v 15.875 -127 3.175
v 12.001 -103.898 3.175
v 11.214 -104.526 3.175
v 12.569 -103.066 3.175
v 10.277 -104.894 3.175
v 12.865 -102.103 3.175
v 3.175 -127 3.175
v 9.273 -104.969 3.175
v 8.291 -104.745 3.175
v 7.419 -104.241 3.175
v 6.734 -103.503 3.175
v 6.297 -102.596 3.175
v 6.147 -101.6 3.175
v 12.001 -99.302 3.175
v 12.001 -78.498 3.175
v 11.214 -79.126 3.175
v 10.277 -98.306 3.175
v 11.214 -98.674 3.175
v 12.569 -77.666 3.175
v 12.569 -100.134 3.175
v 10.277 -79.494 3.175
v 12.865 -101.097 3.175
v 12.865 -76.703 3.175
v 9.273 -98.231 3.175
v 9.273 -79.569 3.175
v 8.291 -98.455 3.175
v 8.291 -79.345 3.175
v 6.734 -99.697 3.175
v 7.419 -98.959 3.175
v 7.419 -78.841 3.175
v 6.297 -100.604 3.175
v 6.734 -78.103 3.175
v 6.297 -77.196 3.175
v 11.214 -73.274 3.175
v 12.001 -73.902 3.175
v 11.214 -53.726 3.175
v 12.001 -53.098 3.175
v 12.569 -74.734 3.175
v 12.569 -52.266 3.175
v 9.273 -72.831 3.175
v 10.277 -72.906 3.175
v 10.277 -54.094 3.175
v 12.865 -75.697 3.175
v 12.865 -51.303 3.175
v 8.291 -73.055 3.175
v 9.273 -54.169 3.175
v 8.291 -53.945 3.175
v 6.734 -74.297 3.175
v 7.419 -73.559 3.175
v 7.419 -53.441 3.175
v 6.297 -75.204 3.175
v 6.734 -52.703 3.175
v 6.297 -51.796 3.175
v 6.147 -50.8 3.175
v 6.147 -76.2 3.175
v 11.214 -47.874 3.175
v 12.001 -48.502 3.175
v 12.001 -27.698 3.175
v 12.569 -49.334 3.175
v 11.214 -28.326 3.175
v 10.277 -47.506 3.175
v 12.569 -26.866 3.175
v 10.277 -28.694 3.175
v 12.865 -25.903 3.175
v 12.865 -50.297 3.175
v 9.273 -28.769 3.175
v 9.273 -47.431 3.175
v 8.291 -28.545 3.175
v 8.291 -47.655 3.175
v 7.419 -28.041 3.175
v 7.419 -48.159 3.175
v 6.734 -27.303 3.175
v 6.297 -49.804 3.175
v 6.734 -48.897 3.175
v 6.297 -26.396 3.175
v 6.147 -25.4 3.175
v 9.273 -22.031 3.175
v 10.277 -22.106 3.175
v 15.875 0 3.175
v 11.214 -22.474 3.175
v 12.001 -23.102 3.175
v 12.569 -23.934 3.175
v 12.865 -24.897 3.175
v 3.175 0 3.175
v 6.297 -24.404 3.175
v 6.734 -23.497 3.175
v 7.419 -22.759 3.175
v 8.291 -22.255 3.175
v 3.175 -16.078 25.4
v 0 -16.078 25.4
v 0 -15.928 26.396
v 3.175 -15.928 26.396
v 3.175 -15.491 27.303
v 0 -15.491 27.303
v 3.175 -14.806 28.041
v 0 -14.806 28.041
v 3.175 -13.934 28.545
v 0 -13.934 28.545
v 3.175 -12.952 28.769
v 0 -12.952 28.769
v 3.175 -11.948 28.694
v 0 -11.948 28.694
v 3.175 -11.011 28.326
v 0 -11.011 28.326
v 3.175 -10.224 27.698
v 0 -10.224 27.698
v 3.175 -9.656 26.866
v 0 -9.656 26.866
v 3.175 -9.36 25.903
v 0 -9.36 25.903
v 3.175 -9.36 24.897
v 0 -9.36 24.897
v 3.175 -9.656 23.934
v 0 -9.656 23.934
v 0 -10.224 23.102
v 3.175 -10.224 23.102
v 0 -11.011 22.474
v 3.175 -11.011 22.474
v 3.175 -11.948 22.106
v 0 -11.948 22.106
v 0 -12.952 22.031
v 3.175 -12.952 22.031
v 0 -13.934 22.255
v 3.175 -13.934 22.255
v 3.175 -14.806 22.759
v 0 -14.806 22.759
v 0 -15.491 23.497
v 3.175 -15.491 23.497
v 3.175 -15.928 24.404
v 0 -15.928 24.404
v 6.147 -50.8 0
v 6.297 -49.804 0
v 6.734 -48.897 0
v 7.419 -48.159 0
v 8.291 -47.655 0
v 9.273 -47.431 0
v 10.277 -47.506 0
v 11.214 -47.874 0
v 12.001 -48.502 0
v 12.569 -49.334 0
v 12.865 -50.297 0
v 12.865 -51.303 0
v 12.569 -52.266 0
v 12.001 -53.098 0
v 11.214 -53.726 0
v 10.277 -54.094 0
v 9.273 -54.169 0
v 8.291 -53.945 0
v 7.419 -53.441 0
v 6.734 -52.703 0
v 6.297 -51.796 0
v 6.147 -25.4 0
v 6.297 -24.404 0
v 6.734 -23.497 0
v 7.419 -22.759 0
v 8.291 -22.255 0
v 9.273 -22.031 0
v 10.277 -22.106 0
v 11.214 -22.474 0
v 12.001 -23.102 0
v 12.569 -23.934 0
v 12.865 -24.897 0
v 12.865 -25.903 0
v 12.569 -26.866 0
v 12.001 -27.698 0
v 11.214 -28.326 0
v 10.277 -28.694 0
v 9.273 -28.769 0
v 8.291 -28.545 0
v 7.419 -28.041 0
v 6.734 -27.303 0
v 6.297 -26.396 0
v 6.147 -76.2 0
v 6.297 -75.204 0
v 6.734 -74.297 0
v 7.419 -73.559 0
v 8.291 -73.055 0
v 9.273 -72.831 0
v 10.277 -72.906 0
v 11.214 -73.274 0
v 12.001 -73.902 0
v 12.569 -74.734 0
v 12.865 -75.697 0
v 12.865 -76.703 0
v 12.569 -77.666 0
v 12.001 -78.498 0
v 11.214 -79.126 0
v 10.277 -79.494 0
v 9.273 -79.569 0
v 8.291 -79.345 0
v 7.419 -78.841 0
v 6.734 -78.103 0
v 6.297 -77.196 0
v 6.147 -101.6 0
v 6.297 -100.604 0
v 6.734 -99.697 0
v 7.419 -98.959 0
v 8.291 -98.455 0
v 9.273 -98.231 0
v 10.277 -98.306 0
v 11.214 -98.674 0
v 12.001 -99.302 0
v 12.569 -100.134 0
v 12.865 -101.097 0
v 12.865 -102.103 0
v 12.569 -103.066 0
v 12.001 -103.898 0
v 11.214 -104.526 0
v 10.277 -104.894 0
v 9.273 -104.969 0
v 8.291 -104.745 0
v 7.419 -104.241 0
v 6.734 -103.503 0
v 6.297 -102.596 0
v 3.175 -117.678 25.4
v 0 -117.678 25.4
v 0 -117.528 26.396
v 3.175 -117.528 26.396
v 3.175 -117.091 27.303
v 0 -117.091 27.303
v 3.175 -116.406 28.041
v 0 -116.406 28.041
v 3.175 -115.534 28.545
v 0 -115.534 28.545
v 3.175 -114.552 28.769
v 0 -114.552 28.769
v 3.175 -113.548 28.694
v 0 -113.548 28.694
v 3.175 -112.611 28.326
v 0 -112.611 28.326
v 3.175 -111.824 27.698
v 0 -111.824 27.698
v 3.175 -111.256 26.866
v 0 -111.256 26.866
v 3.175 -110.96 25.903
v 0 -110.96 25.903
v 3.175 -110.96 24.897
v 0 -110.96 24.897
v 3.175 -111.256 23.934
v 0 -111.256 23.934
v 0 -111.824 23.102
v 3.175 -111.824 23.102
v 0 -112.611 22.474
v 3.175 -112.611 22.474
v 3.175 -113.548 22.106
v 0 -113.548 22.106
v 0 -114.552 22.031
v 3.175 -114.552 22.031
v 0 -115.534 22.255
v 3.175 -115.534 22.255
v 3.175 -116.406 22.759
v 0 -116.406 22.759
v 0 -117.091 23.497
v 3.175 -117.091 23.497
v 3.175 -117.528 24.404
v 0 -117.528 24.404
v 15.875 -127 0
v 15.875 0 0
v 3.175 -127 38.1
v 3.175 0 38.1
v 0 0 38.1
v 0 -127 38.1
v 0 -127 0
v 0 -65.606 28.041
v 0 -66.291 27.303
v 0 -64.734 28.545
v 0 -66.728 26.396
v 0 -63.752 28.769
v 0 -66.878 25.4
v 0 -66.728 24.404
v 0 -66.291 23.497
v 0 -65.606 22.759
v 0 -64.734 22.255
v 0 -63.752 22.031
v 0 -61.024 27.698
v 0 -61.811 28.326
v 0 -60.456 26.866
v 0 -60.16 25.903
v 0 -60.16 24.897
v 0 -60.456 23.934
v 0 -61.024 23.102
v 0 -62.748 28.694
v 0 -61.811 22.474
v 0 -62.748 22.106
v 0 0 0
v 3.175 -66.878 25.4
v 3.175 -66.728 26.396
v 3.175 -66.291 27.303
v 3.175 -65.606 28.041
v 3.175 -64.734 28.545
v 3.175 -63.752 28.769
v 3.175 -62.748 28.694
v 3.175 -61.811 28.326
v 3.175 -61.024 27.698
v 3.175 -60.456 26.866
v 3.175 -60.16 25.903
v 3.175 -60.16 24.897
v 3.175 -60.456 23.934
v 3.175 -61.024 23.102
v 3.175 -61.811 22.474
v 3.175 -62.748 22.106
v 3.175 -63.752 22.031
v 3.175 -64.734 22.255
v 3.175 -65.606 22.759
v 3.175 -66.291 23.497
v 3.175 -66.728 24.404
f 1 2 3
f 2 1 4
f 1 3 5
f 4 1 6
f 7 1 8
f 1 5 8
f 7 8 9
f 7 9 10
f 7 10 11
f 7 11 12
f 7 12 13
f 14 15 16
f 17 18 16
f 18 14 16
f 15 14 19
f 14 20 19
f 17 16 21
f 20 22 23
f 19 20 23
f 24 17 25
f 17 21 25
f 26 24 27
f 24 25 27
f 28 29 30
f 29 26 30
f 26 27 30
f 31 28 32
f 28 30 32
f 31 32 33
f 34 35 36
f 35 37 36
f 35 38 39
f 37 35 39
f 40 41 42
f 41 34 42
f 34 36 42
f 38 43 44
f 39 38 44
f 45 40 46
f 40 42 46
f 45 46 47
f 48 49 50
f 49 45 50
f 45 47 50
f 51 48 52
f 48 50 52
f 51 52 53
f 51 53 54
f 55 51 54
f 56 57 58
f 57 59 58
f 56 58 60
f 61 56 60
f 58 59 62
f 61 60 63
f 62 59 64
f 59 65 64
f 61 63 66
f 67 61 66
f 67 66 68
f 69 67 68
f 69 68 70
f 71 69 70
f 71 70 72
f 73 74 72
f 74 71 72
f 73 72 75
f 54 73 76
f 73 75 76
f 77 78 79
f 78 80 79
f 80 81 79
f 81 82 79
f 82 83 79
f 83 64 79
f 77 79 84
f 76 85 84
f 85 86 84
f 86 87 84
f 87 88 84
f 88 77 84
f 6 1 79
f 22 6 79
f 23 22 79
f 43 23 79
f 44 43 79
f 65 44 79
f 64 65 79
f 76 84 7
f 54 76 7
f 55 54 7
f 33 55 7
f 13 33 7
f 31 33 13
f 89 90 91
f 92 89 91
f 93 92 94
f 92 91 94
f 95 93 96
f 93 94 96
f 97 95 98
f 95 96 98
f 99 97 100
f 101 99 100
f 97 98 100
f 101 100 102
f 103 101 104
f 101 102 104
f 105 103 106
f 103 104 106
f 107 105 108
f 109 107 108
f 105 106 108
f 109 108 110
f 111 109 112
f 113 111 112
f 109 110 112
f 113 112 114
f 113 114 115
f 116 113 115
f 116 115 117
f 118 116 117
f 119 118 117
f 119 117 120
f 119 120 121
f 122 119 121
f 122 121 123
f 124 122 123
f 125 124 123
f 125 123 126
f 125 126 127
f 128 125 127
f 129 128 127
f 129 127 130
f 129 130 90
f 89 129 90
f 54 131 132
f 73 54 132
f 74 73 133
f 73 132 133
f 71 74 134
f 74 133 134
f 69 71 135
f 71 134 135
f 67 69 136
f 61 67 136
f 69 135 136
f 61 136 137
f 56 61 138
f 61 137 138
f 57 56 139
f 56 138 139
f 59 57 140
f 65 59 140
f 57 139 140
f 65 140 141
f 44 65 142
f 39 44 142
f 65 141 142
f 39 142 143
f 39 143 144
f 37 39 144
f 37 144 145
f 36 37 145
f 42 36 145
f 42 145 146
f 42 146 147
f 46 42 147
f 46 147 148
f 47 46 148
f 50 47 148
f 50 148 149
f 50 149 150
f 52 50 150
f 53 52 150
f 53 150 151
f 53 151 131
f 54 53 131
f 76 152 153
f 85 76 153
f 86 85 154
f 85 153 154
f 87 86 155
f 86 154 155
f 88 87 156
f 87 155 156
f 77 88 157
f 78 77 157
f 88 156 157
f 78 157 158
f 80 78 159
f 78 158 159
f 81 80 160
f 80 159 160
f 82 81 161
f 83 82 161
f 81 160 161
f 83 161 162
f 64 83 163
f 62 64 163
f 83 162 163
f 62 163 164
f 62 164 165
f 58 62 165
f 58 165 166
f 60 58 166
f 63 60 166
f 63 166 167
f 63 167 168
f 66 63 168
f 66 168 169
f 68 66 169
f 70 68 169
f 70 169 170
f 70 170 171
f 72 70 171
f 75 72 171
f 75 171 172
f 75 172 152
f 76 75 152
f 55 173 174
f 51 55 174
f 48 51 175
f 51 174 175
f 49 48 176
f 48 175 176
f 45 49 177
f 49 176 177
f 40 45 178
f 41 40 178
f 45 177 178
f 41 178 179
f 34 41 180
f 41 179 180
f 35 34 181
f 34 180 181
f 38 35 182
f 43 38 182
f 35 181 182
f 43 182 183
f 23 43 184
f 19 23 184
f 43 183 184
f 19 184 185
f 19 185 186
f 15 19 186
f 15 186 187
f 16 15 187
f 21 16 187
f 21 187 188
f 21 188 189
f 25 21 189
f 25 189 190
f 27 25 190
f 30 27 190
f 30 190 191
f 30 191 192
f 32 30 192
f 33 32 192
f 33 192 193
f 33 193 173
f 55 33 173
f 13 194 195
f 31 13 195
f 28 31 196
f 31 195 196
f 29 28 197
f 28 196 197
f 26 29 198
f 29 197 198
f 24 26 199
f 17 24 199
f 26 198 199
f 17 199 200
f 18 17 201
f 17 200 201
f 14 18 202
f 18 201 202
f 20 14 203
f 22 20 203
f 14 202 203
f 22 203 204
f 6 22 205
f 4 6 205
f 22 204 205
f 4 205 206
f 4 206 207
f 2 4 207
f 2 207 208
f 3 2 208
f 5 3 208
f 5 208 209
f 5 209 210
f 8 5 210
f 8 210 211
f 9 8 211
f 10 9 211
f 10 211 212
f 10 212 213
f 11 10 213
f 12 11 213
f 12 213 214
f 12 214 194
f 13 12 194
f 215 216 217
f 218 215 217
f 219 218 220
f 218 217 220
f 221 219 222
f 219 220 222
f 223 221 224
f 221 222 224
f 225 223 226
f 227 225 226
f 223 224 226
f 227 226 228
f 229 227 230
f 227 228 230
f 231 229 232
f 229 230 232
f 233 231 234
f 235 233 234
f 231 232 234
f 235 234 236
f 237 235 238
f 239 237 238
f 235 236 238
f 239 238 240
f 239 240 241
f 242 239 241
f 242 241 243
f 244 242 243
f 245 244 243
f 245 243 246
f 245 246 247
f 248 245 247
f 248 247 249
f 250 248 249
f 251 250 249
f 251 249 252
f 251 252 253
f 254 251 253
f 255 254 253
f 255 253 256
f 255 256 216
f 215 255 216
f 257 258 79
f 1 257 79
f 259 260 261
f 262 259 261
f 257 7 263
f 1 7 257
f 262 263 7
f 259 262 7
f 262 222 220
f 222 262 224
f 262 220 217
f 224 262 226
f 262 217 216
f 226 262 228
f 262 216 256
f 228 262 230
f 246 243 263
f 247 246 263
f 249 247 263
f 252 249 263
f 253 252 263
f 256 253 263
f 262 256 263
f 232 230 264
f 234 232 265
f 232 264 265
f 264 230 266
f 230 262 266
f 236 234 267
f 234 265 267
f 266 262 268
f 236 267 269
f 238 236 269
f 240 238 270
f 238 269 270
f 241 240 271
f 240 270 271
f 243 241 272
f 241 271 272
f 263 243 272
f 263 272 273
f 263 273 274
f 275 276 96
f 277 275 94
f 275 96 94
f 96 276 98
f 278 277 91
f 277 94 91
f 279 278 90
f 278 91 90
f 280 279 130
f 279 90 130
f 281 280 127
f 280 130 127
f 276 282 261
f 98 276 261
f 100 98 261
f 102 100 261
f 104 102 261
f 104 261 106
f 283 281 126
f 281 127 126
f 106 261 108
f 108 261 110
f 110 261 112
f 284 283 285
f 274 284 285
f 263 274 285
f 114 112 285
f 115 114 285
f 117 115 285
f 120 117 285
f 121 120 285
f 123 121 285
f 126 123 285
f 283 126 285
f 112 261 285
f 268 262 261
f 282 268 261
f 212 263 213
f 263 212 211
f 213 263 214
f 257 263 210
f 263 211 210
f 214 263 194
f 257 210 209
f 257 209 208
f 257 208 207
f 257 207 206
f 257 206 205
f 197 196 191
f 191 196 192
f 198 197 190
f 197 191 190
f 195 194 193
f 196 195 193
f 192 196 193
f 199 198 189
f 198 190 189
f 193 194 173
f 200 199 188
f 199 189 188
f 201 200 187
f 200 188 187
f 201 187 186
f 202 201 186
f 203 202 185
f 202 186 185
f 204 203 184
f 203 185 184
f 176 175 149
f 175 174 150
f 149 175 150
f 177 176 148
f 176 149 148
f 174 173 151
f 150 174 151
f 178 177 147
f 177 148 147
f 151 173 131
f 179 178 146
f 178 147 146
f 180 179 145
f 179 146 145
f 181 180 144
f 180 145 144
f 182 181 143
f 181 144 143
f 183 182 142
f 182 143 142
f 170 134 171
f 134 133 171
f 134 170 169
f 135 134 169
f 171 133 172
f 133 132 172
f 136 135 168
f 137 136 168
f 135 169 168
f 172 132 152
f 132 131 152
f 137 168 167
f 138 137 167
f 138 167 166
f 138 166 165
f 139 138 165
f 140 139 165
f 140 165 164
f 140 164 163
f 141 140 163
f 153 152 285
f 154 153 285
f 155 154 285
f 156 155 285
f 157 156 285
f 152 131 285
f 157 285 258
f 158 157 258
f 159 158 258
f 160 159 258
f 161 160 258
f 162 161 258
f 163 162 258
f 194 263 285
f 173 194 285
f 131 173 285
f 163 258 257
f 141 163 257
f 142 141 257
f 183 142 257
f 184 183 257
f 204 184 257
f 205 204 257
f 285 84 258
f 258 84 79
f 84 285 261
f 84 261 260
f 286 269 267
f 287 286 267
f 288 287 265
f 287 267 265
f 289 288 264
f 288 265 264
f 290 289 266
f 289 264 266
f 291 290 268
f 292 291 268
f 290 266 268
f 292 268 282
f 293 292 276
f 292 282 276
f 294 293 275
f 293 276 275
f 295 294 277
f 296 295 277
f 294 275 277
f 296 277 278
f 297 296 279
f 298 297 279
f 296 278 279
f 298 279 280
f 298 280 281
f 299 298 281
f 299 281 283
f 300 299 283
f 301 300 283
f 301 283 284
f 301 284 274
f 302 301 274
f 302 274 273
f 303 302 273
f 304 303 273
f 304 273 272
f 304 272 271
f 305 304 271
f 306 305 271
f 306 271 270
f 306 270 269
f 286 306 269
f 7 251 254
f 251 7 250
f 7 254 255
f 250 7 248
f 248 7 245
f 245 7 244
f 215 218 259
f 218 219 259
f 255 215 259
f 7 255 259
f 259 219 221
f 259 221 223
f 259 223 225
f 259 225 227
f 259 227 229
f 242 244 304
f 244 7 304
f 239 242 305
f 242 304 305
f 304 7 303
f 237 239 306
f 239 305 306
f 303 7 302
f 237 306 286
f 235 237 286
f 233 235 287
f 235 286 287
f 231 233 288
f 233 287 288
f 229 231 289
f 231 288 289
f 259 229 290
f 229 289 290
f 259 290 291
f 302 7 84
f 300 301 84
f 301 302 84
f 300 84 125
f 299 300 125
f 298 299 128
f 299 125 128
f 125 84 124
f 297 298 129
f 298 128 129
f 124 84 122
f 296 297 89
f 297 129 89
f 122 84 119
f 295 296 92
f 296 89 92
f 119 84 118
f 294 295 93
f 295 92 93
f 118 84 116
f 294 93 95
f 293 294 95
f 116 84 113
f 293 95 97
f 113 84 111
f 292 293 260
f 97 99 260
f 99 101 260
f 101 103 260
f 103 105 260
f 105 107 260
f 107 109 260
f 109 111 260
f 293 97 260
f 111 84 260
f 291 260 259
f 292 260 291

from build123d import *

# Parameters (mm, degrees)
F1_DEPTH = 127
F3_D     = 6.7564
F5_D     = 6.7564


with BuildPart() as f1:
    # F0 (on Front) → F1 (new body)
    with BuildSketch(Plane.XZ):
        Polygon((0, 38.1), (0, 0), (15.875, 0), (15.875, 3.175), (3.175, 3.175), (3.175, 38.1), align=None)
    extrude(amount=F1_DEPTH)

    # F3 (through all)
    with Locations(Plane.YZ.offset(3.175)):
        with Locations((-114.3, 25.4), (-63.5, 25.4), (-12.7, 25.4)):
            Hole(F3_D / 2)

    # F5 (through all)
    with Locations(Plane.XY.offset(3.175)):
        with Locations((9.525, -101.6), (9.525, -25.4), (9.525, -76.2), (9.525, -50.8)):
            Hole(F5_D / 2)


solid = f1.part
